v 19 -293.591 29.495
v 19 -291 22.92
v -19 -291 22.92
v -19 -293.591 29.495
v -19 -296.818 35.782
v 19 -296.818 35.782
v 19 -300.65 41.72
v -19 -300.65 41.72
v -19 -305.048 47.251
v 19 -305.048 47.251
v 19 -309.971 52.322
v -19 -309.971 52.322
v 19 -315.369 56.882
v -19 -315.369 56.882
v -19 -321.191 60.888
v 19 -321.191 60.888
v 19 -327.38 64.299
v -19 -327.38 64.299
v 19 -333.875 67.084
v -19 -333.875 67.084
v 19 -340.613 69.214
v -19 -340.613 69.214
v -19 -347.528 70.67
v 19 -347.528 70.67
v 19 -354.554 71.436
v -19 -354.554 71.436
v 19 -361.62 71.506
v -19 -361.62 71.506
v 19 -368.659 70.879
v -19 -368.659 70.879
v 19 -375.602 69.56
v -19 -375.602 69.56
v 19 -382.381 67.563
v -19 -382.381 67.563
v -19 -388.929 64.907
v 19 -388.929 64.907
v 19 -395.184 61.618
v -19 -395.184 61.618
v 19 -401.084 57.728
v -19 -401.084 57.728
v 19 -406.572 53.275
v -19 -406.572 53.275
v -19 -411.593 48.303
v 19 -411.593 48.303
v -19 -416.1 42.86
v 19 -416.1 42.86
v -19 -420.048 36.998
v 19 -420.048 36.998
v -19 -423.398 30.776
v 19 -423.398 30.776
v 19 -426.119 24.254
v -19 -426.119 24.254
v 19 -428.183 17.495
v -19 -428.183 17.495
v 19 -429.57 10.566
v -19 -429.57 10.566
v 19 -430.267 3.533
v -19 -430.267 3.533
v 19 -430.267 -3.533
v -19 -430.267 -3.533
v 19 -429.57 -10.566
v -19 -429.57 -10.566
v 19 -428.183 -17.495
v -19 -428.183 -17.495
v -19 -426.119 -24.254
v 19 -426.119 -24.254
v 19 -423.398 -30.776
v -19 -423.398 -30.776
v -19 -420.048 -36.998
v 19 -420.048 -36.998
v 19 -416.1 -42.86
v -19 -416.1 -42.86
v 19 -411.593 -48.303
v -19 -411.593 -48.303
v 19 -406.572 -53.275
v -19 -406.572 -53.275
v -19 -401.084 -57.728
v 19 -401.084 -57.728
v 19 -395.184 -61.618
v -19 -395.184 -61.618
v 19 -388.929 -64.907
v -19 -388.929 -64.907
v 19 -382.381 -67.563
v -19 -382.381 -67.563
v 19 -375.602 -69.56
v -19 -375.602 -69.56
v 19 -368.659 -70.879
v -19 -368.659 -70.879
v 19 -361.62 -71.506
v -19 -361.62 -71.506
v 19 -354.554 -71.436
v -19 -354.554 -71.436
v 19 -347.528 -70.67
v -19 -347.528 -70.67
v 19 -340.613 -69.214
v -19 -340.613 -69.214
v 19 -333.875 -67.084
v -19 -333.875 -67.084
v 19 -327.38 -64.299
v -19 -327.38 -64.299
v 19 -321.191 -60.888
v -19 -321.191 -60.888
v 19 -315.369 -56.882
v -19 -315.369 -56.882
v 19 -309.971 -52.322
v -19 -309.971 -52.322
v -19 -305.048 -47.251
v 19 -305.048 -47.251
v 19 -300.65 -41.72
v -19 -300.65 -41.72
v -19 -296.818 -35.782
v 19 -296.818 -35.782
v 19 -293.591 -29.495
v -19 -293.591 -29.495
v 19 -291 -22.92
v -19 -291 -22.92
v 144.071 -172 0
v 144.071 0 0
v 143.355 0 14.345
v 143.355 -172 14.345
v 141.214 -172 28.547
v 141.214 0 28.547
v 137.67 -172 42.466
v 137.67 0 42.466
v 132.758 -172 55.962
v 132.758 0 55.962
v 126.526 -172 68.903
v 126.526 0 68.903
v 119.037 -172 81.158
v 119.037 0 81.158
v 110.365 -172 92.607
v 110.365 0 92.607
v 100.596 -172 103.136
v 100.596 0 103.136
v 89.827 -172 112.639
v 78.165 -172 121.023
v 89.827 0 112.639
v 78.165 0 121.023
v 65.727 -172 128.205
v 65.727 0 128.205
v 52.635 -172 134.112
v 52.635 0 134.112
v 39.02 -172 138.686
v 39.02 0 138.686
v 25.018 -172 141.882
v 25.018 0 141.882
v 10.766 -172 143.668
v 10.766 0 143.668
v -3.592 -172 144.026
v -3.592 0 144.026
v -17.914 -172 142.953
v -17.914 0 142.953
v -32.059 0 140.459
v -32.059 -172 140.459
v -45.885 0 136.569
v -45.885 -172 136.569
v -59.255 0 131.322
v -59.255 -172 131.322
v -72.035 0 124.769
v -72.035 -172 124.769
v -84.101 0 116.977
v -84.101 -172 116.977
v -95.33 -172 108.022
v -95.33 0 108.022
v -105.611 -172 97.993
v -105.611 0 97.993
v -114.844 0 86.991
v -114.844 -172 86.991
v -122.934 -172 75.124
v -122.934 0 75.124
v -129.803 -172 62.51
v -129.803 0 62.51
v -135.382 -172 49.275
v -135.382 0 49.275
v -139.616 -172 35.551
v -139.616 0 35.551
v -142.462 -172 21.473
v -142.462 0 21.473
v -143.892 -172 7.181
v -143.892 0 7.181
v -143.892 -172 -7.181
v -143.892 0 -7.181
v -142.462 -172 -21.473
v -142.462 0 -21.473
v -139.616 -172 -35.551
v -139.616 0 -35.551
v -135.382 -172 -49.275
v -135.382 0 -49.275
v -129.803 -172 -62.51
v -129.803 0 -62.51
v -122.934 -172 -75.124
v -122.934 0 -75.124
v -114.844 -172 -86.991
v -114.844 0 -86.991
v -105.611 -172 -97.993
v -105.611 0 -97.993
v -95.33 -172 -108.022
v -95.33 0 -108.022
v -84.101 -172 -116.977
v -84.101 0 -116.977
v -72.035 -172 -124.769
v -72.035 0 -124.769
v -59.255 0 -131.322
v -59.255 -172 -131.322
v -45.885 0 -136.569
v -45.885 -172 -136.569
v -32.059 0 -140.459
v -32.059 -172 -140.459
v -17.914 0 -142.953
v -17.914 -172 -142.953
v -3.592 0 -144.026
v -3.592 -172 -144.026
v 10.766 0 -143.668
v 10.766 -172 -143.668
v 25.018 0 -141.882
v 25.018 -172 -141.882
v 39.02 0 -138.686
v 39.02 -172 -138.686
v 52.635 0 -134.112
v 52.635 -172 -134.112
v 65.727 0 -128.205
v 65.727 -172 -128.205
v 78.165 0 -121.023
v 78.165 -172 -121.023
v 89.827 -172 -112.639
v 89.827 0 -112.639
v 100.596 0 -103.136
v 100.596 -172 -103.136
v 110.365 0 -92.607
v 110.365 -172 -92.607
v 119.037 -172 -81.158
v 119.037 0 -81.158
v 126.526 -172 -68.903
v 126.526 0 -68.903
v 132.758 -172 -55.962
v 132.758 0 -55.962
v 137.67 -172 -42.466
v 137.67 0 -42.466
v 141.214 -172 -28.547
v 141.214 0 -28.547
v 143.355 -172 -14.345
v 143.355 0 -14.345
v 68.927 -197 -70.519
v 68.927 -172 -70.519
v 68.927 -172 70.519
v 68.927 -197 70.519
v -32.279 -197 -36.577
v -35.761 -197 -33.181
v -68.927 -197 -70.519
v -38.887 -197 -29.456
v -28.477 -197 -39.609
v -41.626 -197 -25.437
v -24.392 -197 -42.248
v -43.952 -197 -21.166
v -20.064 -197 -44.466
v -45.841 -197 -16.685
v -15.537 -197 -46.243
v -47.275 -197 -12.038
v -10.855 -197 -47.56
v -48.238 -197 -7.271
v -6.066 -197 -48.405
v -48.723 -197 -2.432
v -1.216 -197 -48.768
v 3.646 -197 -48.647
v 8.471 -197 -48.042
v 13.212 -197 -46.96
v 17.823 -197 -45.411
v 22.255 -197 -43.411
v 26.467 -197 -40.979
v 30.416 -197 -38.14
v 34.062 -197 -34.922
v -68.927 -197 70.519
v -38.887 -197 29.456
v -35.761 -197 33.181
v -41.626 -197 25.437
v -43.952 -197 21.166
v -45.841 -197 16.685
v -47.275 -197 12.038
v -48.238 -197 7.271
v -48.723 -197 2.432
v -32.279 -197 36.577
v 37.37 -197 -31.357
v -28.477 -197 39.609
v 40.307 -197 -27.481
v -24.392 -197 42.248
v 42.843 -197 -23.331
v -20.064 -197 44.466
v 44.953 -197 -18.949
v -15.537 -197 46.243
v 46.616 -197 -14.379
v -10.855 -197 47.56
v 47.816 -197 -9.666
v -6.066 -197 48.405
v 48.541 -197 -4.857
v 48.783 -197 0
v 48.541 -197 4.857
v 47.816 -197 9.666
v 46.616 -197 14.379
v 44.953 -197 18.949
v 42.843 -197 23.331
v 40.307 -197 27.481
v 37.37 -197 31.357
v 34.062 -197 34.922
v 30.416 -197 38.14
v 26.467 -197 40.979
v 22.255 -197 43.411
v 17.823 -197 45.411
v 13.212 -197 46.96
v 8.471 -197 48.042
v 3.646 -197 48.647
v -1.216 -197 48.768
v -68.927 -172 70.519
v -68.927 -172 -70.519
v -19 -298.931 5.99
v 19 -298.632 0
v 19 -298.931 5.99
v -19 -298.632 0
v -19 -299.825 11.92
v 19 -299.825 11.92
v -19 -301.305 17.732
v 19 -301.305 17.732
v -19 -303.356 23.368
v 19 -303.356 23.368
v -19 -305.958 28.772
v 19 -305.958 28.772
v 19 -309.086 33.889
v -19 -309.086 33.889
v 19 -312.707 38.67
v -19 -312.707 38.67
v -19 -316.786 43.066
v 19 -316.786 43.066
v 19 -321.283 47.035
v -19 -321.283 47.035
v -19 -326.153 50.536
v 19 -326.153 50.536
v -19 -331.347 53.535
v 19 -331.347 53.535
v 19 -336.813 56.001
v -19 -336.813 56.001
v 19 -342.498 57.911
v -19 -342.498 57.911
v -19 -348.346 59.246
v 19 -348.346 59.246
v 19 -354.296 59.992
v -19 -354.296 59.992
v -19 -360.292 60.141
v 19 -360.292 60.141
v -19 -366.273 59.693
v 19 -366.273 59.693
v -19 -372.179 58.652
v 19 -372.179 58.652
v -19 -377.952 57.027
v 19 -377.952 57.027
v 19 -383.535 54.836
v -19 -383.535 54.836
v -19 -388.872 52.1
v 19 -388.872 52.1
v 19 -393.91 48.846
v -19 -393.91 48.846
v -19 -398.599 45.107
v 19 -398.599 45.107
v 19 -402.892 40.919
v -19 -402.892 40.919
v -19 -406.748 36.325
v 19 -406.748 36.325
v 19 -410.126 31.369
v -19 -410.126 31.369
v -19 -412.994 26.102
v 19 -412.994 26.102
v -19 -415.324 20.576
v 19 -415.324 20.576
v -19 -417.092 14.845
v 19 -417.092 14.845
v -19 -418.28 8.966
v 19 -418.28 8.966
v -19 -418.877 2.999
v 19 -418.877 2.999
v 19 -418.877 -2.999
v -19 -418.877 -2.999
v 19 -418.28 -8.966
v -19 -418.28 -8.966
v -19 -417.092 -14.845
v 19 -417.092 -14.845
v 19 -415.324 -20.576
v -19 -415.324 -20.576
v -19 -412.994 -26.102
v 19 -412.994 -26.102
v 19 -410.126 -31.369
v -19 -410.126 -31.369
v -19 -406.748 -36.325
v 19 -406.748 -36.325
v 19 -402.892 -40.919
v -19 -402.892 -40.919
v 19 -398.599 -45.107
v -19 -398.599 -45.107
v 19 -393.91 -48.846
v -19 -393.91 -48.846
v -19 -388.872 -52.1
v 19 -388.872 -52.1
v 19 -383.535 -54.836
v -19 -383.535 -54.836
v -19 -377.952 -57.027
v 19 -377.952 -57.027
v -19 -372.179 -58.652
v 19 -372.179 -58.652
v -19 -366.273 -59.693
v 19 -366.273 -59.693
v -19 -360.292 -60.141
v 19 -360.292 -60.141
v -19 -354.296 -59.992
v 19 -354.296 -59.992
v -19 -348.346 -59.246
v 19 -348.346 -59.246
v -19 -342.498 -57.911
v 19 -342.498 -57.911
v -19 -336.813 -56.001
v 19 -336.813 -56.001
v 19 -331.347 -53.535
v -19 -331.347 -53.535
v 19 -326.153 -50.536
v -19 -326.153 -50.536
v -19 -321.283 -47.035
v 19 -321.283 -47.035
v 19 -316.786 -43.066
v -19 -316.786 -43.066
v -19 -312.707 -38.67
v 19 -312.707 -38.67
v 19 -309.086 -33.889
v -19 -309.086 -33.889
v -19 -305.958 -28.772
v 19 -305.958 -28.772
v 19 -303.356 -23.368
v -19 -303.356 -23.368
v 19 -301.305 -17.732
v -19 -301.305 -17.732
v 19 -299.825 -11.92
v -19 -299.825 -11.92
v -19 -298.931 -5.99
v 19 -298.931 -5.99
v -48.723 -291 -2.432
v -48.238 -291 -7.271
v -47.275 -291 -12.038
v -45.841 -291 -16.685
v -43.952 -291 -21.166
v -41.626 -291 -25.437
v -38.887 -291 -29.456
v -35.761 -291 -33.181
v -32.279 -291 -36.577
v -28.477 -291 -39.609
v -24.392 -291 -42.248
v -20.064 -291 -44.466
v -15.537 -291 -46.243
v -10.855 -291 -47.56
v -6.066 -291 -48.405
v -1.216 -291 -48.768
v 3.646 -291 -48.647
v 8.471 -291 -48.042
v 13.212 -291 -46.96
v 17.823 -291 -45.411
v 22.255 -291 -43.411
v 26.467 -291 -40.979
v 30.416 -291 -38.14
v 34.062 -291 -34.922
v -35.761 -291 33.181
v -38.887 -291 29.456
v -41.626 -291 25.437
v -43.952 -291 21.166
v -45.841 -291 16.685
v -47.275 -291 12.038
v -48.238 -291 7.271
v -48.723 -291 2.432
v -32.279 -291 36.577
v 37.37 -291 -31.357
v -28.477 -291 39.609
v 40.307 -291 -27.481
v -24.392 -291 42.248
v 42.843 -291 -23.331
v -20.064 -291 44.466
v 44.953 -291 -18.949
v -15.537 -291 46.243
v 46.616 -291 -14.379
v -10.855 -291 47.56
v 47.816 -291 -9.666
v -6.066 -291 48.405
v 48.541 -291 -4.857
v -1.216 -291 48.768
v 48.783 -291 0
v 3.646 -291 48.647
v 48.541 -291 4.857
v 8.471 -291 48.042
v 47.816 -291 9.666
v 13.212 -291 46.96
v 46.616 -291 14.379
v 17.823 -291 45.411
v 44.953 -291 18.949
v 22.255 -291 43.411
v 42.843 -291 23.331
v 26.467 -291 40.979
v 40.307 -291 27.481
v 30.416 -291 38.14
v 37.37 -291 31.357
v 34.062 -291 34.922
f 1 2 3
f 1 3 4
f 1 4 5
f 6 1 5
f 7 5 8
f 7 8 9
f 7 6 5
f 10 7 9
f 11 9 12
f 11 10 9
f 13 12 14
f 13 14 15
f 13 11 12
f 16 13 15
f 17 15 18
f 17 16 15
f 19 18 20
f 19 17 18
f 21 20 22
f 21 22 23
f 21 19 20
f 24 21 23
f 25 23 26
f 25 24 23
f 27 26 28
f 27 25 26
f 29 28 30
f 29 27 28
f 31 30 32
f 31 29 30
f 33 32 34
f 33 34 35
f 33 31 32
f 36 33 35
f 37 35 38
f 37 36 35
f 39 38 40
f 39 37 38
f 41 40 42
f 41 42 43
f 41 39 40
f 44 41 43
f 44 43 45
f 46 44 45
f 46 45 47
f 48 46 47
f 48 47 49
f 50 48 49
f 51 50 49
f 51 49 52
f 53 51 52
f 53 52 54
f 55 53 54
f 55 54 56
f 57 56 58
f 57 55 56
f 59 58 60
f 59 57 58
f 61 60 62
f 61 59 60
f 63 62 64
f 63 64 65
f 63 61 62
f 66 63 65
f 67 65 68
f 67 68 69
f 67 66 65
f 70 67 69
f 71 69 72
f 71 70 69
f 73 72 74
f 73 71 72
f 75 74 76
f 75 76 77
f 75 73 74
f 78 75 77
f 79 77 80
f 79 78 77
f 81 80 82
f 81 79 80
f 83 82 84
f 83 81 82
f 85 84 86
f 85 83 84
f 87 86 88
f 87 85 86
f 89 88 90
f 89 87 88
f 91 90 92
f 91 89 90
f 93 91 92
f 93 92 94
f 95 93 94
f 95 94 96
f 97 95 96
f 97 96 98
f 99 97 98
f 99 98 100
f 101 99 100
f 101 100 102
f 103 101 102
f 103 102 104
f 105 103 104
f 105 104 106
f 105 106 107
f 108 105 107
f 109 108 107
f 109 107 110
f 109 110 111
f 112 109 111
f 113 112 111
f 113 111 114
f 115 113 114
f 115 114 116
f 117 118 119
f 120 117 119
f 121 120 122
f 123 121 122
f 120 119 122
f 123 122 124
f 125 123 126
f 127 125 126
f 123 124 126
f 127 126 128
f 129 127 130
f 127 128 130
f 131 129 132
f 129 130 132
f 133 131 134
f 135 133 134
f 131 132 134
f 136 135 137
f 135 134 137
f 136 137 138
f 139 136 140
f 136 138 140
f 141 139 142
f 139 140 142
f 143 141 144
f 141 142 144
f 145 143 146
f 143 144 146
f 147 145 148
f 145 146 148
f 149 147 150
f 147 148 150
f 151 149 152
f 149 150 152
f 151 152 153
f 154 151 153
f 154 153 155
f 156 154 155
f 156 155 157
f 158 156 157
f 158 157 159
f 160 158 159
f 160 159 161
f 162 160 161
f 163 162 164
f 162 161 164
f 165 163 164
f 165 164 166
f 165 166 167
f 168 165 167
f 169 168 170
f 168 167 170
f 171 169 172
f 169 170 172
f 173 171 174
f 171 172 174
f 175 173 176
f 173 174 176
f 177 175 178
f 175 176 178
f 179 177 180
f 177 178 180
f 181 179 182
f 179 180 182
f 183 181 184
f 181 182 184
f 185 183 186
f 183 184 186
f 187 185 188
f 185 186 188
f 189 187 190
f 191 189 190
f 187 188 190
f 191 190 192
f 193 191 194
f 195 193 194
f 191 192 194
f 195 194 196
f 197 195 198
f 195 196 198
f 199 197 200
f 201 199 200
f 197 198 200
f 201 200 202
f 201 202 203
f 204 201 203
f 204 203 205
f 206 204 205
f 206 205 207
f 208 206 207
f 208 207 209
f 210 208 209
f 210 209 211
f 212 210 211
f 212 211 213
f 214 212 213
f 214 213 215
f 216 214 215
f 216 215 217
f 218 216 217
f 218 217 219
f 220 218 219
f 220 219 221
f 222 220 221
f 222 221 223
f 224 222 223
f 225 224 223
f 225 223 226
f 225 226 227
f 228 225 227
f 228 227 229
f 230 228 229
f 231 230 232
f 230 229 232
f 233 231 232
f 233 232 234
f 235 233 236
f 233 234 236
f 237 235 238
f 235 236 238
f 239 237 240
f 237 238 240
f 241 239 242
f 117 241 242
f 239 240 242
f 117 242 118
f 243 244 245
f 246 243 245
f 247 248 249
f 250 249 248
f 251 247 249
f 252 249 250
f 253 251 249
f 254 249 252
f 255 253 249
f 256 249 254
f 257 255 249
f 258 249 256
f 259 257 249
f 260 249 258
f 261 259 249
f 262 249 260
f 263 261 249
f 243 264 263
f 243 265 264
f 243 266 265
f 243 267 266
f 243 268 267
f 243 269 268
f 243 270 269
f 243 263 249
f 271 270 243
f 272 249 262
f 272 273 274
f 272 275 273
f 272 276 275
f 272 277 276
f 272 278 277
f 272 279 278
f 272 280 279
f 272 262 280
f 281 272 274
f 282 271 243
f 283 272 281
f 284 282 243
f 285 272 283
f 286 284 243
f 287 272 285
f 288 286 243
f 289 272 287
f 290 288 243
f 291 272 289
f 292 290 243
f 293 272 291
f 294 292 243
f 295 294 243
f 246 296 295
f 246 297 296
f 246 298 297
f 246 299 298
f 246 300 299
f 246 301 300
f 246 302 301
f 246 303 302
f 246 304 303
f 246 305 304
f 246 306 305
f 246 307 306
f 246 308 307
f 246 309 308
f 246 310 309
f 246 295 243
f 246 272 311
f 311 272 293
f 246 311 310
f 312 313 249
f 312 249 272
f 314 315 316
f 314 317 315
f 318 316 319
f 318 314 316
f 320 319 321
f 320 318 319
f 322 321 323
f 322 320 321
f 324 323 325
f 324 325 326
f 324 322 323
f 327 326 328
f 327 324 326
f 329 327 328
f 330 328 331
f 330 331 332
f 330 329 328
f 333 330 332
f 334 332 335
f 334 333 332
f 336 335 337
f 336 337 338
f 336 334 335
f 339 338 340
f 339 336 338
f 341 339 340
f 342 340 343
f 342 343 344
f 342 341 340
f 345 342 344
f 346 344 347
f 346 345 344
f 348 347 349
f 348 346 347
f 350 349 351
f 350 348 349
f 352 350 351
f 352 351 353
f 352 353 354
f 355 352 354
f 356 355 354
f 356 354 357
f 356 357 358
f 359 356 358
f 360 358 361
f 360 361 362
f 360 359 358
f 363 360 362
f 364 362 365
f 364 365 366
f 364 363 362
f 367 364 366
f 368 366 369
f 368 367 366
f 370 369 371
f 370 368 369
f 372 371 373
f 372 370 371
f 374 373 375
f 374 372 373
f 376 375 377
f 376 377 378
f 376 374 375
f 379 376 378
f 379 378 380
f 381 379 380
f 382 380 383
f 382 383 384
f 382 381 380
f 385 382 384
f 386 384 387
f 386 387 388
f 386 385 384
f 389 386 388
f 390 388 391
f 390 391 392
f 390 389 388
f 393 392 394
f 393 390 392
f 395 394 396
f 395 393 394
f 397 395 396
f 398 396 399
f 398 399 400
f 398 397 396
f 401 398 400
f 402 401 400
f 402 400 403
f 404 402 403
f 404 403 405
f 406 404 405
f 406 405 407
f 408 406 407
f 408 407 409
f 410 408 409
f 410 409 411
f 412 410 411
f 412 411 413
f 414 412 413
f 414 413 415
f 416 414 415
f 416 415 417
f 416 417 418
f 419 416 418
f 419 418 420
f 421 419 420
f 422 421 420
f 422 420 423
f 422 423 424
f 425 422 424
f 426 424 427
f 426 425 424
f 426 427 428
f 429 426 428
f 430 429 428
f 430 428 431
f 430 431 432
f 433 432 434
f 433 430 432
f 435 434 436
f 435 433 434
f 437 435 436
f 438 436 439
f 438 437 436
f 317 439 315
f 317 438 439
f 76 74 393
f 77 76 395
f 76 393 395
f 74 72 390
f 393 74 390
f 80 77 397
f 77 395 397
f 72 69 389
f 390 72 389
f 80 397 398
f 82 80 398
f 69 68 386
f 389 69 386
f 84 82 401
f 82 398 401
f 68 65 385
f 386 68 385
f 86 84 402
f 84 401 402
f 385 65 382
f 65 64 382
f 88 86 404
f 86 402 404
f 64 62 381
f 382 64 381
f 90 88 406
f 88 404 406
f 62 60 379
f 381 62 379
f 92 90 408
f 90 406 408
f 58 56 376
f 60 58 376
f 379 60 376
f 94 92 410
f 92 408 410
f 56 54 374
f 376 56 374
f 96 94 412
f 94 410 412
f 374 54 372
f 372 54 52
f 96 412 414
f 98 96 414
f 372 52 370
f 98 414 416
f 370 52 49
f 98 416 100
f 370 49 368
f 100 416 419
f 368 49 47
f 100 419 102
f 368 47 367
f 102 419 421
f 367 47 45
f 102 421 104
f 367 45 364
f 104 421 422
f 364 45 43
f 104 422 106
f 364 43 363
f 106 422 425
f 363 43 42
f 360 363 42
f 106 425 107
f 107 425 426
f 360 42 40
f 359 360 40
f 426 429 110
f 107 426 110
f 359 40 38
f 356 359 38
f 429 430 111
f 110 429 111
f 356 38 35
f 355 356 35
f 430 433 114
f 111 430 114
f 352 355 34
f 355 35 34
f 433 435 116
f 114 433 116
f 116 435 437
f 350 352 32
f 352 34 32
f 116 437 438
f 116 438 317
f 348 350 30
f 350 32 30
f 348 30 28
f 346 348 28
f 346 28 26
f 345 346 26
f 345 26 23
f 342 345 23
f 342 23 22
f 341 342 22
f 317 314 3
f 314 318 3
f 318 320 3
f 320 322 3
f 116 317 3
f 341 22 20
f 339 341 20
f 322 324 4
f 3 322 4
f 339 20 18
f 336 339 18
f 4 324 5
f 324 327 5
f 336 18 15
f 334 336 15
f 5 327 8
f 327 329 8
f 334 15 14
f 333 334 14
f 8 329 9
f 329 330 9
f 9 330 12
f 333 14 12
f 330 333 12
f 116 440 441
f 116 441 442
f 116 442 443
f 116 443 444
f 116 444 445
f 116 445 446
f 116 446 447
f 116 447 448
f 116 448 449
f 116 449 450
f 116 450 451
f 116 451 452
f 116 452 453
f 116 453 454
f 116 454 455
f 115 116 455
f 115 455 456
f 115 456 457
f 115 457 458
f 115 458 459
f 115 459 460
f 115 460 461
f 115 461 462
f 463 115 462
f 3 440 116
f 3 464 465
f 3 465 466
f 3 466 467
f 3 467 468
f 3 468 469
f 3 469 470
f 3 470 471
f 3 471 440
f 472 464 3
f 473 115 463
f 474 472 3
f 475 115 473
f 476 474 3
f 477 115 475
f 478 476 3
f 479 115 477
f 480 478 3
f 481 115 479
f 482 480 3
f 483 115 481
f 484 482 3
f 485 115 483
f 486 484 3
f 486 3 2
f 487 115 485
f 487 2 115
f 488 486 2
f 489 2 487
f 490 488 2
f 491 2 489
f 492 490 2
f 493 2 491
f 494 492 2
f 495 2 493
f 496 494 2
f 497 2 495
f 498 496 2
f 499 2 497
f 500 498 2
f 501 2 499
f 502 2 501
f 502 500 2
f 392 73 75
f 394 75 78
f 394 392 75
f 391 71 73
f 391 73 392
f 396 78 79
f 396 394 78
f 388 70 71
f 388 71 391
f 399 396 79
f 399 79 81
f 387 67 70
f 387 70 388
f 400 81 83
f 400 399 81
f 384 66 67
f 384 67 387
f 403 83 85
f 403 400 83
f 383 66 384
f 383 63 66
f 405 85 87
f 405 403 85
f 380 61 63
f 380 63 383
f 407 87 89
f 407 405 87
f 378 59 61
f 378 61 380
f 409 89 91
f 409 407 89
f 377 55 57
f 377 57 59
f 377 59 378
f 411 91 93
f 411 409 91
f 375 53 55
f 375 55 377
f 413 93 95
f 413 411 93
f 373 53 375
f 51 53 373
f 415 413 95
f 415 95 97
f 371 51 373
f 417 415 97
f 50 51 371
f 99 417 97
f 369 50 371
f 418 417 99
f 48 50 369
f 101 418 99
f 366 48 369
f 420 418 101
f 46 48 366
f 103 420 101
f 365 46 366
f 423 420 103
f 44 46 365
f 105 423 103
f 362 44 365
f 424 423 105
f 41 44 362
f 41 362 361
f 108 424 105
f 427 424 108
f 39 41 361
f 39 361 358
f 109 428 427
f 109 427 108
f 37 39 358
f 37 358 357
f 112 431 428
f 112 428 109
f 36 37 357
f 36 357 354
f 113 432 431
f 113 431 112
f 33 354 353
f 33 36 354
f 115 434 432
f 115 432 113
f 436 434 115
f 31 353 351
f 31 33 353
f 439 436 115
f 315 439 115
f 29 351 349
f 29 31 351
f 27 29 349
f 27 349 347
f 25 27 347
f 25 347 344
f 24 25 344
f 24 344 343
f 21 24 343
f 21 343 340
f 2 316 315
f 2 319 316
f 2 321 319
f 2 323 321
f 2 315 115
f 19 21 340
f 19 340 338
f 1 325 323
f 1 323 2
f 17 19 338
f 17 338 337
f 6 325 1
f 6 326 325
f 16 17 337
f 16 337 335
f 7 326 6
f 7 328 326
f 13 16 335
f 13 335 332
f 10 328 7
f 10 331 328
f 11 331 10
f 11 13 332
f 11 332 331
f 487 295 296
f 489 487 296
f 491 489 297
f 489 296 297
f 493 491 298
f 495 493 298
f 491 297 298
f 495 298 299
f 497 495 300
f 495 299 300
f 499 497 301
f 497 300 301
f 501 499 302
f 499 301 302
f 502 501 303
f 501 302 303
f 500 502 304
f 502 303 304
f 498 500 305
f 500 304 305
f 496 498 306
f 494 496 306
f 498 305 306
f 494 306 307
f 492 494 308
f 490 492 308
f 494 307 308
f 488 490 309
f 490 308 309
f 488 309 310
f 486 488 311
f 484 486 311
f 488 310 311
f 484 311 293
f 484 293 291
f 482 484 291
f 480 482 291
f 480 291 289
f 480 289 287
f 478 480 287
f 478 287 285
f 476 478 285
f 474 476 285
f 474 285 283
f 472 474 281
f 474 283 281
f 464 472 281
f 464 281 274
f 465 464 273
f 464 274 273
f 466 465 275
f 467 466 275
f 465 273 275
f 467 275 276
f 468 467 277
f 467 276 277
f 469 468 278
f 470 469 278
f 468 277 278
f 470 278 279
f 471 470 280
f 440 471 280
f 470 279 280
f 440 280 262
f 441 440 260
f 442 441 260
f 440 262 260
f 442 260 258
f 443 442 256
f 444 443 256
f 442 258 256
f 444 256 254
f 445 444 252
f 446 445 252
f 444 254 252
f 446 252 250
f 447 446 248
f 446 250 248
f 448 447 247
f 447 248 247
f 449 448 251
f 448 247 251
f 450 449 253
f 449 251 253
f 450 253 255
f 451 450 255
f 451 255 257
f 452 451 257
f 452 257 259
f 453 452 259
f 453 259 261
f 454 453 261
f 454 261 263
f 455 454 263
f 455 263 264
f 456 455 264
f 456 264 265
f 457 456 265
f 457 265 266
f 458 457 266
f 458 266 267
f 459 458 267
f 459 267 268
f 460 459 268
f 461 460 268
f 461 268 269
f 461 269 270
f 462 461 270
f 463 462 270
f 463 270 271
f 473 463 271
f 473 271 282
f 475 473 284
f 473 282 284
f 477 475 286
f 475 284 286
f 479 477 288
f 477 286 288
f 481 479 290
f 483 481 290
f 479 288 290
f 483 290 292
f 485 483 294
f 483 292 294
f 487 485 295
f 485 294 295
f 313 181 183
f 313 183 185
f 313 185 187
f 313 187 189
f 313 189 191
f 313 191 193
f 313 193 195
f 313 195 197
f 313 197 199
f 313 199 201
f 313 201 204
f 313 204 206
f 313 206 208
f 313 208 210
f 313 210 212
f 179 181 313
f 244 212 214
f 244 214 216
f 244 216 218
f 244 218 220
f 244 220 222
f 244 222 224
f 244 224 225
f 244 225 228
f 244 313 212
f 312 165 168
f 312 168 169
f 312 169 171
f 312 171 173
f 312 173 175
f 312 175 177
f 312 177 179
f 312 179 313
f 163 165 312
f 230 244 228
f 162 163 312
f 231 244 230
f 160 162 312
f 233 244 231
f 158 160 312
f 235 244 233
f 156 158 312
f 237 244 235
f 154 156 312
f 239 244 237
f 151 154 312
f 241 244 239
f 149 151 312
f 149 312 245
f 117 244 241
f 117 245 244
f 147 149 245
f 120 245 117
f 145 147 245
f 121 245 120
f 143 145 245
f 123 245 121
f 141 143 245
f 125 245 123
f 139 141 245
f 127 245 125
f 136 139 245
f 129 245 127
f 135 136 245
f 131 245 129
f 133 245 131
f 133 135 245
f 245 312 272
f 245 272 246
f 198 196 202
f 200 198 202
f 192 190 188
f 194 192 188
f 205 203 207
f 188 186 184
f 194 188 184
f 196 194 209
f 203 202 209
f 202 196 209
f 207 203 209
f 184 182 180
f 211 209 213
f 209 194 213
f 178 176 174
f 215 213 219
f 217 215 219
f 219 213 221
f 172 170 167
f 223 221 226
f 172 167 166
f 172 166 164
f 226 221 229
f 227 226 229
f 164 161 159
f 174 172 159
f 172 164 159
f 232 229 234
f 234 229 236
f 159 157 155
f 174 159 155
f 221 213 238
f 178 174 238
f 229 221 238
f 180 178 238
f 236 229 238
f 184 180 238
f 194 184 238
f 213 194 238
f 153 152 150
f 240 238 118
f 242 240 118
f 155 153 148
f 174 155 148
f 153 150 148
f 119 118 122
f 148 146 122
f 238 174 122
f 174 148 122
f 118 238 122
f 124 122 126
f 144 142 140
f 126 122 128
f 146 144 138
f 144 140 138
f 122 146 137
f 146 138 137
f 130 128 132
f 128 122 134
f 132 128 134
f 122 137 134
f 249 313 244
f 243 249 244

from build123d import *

# Parameters (mm, degrees)
F0_R     = 144.070975
F1_DEPTH = 172
F2_W     = 137.853176
F2_H     = 141.037912
F3_DEPTH = 25
F4_R     = 48.783295
F5_DEPTH = 94
F6_R     = 71.562045
F6_R_2   = 60.159881
F7_DEPTH = 19


with BuildPart() as f1:
    # F0 (on Front) → F1 (new body)
    with BuildSketch(Plane.XZ):
        Circle(F0_R)
    extrude(amount=F1_DEPTH)

    # F2 (on face) → F3 (join)
    with BuildSketch(Plane.XZ.offset(172)):
        Rectangle(F2_W, F2_H)
    extrude(amount=F3_DEPTH)

    # F4 (on face) → F5 (join)
    with BuildSketch(Plane.XZ.offset(197)):
        Circle(F4_R)
    extrude(amount=F5_DEPTH)

    # F6 (on Right) → F7 (join, symmetric)
    with BuildSketch(Plane.YZ):
        with Locations((-358.792186, 0)):
            Circle(F6_R)
        with Locations((-358.792186, 0)):
            Circle(F6_R_2, mode=Mode.SUBTRACT)
    extrude(amount=F7_DEPTH, both=True)


solid = f1.part
